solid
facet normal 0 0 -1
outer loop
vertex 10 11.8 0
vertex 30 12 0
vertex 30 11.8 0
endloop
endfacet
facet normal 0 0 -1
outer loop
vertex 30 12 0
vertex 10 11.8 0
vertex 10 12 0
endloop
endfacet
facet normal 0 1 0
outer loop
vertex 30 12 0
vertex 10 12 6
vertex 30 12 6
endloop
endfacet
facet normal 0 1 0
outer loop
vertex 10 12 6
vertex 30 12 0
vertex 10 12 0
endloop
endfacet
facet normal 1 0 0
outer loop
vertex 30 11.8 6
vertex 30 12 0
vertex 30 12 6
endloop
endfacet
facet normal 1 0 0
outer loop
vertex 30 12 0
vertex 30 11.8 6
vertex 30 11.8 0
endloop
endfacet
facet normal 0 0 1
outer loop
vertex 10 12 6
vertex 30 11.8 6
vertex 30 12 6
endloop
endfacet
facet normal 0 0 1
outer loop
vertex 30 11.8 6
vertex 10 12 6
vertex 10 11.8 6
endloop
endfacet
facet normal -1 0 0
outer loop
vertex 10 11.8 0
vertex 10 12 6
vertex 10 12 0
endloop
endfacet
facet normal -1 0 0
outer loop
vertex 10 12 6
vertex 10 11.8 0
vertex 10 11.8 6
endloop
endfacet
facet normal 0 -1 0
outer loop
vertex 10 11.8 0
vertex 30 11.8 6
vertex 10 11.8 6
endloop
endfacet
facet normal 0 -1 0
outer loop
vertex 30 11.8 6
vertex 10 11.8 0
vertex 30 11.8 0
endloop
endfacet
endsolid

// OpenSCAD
// file: assembly.scad
// The parts of one assembly, each at the pose it occupies in the product.
//
// Poses live here and nowhere else. Every probe beside this file intersects
// two of these modules AS PLACED, so an interference number is the assembly's
// interference and not a number about geometry sitting at the origin. Move a
// part by editing this file and every probe follows it.

RAIL  = [40, 12, 8];   // extruded rail, front lower corner at the origin
FOOT  = [20, 10, 6];   // clips onto the rail's far flank
COVER = [16, 12, 3];   // lies flat on the rail's top face
POST  = [6, 4, 3];     // the tallest thing standing on the rail
CRUSH = 0.2;           // designed interference, on the flank, per fit

module rail() {
    cube(RAIL);
}

// Clipped on from +y and deliberately proud by CRUSH, so the flanks overlap.
// That overlap IS the design: too little and the joint rattles, too much and
// the assembly will not close.
module foot() {
    translate([10, RAIL[1] - CRUSH, 0]) cube(FOOT);
}

// Seated on the rail rather than fastened into it, so the two parts touch
// across a face and share no volume at all.
module cover() {
    translate([2, 0, RAIL[2]]) cube(COVER);
}

module post() {
    translate([30, 4, RAIL[2]]) cube(POST);
}

// The lid the post has to clear.
module lid() {
    translate([0, 0, 20]) cube([40, 12, 3]);
}
// main file
// Probe: the crush ribbon between the foot and the rail. This is the material
// that has to yield for the fit to close, and it must exist — an empty result
// here means the joint is loose.
include <assembly.scad>

intersection() {
    rail();
    foot();
}
